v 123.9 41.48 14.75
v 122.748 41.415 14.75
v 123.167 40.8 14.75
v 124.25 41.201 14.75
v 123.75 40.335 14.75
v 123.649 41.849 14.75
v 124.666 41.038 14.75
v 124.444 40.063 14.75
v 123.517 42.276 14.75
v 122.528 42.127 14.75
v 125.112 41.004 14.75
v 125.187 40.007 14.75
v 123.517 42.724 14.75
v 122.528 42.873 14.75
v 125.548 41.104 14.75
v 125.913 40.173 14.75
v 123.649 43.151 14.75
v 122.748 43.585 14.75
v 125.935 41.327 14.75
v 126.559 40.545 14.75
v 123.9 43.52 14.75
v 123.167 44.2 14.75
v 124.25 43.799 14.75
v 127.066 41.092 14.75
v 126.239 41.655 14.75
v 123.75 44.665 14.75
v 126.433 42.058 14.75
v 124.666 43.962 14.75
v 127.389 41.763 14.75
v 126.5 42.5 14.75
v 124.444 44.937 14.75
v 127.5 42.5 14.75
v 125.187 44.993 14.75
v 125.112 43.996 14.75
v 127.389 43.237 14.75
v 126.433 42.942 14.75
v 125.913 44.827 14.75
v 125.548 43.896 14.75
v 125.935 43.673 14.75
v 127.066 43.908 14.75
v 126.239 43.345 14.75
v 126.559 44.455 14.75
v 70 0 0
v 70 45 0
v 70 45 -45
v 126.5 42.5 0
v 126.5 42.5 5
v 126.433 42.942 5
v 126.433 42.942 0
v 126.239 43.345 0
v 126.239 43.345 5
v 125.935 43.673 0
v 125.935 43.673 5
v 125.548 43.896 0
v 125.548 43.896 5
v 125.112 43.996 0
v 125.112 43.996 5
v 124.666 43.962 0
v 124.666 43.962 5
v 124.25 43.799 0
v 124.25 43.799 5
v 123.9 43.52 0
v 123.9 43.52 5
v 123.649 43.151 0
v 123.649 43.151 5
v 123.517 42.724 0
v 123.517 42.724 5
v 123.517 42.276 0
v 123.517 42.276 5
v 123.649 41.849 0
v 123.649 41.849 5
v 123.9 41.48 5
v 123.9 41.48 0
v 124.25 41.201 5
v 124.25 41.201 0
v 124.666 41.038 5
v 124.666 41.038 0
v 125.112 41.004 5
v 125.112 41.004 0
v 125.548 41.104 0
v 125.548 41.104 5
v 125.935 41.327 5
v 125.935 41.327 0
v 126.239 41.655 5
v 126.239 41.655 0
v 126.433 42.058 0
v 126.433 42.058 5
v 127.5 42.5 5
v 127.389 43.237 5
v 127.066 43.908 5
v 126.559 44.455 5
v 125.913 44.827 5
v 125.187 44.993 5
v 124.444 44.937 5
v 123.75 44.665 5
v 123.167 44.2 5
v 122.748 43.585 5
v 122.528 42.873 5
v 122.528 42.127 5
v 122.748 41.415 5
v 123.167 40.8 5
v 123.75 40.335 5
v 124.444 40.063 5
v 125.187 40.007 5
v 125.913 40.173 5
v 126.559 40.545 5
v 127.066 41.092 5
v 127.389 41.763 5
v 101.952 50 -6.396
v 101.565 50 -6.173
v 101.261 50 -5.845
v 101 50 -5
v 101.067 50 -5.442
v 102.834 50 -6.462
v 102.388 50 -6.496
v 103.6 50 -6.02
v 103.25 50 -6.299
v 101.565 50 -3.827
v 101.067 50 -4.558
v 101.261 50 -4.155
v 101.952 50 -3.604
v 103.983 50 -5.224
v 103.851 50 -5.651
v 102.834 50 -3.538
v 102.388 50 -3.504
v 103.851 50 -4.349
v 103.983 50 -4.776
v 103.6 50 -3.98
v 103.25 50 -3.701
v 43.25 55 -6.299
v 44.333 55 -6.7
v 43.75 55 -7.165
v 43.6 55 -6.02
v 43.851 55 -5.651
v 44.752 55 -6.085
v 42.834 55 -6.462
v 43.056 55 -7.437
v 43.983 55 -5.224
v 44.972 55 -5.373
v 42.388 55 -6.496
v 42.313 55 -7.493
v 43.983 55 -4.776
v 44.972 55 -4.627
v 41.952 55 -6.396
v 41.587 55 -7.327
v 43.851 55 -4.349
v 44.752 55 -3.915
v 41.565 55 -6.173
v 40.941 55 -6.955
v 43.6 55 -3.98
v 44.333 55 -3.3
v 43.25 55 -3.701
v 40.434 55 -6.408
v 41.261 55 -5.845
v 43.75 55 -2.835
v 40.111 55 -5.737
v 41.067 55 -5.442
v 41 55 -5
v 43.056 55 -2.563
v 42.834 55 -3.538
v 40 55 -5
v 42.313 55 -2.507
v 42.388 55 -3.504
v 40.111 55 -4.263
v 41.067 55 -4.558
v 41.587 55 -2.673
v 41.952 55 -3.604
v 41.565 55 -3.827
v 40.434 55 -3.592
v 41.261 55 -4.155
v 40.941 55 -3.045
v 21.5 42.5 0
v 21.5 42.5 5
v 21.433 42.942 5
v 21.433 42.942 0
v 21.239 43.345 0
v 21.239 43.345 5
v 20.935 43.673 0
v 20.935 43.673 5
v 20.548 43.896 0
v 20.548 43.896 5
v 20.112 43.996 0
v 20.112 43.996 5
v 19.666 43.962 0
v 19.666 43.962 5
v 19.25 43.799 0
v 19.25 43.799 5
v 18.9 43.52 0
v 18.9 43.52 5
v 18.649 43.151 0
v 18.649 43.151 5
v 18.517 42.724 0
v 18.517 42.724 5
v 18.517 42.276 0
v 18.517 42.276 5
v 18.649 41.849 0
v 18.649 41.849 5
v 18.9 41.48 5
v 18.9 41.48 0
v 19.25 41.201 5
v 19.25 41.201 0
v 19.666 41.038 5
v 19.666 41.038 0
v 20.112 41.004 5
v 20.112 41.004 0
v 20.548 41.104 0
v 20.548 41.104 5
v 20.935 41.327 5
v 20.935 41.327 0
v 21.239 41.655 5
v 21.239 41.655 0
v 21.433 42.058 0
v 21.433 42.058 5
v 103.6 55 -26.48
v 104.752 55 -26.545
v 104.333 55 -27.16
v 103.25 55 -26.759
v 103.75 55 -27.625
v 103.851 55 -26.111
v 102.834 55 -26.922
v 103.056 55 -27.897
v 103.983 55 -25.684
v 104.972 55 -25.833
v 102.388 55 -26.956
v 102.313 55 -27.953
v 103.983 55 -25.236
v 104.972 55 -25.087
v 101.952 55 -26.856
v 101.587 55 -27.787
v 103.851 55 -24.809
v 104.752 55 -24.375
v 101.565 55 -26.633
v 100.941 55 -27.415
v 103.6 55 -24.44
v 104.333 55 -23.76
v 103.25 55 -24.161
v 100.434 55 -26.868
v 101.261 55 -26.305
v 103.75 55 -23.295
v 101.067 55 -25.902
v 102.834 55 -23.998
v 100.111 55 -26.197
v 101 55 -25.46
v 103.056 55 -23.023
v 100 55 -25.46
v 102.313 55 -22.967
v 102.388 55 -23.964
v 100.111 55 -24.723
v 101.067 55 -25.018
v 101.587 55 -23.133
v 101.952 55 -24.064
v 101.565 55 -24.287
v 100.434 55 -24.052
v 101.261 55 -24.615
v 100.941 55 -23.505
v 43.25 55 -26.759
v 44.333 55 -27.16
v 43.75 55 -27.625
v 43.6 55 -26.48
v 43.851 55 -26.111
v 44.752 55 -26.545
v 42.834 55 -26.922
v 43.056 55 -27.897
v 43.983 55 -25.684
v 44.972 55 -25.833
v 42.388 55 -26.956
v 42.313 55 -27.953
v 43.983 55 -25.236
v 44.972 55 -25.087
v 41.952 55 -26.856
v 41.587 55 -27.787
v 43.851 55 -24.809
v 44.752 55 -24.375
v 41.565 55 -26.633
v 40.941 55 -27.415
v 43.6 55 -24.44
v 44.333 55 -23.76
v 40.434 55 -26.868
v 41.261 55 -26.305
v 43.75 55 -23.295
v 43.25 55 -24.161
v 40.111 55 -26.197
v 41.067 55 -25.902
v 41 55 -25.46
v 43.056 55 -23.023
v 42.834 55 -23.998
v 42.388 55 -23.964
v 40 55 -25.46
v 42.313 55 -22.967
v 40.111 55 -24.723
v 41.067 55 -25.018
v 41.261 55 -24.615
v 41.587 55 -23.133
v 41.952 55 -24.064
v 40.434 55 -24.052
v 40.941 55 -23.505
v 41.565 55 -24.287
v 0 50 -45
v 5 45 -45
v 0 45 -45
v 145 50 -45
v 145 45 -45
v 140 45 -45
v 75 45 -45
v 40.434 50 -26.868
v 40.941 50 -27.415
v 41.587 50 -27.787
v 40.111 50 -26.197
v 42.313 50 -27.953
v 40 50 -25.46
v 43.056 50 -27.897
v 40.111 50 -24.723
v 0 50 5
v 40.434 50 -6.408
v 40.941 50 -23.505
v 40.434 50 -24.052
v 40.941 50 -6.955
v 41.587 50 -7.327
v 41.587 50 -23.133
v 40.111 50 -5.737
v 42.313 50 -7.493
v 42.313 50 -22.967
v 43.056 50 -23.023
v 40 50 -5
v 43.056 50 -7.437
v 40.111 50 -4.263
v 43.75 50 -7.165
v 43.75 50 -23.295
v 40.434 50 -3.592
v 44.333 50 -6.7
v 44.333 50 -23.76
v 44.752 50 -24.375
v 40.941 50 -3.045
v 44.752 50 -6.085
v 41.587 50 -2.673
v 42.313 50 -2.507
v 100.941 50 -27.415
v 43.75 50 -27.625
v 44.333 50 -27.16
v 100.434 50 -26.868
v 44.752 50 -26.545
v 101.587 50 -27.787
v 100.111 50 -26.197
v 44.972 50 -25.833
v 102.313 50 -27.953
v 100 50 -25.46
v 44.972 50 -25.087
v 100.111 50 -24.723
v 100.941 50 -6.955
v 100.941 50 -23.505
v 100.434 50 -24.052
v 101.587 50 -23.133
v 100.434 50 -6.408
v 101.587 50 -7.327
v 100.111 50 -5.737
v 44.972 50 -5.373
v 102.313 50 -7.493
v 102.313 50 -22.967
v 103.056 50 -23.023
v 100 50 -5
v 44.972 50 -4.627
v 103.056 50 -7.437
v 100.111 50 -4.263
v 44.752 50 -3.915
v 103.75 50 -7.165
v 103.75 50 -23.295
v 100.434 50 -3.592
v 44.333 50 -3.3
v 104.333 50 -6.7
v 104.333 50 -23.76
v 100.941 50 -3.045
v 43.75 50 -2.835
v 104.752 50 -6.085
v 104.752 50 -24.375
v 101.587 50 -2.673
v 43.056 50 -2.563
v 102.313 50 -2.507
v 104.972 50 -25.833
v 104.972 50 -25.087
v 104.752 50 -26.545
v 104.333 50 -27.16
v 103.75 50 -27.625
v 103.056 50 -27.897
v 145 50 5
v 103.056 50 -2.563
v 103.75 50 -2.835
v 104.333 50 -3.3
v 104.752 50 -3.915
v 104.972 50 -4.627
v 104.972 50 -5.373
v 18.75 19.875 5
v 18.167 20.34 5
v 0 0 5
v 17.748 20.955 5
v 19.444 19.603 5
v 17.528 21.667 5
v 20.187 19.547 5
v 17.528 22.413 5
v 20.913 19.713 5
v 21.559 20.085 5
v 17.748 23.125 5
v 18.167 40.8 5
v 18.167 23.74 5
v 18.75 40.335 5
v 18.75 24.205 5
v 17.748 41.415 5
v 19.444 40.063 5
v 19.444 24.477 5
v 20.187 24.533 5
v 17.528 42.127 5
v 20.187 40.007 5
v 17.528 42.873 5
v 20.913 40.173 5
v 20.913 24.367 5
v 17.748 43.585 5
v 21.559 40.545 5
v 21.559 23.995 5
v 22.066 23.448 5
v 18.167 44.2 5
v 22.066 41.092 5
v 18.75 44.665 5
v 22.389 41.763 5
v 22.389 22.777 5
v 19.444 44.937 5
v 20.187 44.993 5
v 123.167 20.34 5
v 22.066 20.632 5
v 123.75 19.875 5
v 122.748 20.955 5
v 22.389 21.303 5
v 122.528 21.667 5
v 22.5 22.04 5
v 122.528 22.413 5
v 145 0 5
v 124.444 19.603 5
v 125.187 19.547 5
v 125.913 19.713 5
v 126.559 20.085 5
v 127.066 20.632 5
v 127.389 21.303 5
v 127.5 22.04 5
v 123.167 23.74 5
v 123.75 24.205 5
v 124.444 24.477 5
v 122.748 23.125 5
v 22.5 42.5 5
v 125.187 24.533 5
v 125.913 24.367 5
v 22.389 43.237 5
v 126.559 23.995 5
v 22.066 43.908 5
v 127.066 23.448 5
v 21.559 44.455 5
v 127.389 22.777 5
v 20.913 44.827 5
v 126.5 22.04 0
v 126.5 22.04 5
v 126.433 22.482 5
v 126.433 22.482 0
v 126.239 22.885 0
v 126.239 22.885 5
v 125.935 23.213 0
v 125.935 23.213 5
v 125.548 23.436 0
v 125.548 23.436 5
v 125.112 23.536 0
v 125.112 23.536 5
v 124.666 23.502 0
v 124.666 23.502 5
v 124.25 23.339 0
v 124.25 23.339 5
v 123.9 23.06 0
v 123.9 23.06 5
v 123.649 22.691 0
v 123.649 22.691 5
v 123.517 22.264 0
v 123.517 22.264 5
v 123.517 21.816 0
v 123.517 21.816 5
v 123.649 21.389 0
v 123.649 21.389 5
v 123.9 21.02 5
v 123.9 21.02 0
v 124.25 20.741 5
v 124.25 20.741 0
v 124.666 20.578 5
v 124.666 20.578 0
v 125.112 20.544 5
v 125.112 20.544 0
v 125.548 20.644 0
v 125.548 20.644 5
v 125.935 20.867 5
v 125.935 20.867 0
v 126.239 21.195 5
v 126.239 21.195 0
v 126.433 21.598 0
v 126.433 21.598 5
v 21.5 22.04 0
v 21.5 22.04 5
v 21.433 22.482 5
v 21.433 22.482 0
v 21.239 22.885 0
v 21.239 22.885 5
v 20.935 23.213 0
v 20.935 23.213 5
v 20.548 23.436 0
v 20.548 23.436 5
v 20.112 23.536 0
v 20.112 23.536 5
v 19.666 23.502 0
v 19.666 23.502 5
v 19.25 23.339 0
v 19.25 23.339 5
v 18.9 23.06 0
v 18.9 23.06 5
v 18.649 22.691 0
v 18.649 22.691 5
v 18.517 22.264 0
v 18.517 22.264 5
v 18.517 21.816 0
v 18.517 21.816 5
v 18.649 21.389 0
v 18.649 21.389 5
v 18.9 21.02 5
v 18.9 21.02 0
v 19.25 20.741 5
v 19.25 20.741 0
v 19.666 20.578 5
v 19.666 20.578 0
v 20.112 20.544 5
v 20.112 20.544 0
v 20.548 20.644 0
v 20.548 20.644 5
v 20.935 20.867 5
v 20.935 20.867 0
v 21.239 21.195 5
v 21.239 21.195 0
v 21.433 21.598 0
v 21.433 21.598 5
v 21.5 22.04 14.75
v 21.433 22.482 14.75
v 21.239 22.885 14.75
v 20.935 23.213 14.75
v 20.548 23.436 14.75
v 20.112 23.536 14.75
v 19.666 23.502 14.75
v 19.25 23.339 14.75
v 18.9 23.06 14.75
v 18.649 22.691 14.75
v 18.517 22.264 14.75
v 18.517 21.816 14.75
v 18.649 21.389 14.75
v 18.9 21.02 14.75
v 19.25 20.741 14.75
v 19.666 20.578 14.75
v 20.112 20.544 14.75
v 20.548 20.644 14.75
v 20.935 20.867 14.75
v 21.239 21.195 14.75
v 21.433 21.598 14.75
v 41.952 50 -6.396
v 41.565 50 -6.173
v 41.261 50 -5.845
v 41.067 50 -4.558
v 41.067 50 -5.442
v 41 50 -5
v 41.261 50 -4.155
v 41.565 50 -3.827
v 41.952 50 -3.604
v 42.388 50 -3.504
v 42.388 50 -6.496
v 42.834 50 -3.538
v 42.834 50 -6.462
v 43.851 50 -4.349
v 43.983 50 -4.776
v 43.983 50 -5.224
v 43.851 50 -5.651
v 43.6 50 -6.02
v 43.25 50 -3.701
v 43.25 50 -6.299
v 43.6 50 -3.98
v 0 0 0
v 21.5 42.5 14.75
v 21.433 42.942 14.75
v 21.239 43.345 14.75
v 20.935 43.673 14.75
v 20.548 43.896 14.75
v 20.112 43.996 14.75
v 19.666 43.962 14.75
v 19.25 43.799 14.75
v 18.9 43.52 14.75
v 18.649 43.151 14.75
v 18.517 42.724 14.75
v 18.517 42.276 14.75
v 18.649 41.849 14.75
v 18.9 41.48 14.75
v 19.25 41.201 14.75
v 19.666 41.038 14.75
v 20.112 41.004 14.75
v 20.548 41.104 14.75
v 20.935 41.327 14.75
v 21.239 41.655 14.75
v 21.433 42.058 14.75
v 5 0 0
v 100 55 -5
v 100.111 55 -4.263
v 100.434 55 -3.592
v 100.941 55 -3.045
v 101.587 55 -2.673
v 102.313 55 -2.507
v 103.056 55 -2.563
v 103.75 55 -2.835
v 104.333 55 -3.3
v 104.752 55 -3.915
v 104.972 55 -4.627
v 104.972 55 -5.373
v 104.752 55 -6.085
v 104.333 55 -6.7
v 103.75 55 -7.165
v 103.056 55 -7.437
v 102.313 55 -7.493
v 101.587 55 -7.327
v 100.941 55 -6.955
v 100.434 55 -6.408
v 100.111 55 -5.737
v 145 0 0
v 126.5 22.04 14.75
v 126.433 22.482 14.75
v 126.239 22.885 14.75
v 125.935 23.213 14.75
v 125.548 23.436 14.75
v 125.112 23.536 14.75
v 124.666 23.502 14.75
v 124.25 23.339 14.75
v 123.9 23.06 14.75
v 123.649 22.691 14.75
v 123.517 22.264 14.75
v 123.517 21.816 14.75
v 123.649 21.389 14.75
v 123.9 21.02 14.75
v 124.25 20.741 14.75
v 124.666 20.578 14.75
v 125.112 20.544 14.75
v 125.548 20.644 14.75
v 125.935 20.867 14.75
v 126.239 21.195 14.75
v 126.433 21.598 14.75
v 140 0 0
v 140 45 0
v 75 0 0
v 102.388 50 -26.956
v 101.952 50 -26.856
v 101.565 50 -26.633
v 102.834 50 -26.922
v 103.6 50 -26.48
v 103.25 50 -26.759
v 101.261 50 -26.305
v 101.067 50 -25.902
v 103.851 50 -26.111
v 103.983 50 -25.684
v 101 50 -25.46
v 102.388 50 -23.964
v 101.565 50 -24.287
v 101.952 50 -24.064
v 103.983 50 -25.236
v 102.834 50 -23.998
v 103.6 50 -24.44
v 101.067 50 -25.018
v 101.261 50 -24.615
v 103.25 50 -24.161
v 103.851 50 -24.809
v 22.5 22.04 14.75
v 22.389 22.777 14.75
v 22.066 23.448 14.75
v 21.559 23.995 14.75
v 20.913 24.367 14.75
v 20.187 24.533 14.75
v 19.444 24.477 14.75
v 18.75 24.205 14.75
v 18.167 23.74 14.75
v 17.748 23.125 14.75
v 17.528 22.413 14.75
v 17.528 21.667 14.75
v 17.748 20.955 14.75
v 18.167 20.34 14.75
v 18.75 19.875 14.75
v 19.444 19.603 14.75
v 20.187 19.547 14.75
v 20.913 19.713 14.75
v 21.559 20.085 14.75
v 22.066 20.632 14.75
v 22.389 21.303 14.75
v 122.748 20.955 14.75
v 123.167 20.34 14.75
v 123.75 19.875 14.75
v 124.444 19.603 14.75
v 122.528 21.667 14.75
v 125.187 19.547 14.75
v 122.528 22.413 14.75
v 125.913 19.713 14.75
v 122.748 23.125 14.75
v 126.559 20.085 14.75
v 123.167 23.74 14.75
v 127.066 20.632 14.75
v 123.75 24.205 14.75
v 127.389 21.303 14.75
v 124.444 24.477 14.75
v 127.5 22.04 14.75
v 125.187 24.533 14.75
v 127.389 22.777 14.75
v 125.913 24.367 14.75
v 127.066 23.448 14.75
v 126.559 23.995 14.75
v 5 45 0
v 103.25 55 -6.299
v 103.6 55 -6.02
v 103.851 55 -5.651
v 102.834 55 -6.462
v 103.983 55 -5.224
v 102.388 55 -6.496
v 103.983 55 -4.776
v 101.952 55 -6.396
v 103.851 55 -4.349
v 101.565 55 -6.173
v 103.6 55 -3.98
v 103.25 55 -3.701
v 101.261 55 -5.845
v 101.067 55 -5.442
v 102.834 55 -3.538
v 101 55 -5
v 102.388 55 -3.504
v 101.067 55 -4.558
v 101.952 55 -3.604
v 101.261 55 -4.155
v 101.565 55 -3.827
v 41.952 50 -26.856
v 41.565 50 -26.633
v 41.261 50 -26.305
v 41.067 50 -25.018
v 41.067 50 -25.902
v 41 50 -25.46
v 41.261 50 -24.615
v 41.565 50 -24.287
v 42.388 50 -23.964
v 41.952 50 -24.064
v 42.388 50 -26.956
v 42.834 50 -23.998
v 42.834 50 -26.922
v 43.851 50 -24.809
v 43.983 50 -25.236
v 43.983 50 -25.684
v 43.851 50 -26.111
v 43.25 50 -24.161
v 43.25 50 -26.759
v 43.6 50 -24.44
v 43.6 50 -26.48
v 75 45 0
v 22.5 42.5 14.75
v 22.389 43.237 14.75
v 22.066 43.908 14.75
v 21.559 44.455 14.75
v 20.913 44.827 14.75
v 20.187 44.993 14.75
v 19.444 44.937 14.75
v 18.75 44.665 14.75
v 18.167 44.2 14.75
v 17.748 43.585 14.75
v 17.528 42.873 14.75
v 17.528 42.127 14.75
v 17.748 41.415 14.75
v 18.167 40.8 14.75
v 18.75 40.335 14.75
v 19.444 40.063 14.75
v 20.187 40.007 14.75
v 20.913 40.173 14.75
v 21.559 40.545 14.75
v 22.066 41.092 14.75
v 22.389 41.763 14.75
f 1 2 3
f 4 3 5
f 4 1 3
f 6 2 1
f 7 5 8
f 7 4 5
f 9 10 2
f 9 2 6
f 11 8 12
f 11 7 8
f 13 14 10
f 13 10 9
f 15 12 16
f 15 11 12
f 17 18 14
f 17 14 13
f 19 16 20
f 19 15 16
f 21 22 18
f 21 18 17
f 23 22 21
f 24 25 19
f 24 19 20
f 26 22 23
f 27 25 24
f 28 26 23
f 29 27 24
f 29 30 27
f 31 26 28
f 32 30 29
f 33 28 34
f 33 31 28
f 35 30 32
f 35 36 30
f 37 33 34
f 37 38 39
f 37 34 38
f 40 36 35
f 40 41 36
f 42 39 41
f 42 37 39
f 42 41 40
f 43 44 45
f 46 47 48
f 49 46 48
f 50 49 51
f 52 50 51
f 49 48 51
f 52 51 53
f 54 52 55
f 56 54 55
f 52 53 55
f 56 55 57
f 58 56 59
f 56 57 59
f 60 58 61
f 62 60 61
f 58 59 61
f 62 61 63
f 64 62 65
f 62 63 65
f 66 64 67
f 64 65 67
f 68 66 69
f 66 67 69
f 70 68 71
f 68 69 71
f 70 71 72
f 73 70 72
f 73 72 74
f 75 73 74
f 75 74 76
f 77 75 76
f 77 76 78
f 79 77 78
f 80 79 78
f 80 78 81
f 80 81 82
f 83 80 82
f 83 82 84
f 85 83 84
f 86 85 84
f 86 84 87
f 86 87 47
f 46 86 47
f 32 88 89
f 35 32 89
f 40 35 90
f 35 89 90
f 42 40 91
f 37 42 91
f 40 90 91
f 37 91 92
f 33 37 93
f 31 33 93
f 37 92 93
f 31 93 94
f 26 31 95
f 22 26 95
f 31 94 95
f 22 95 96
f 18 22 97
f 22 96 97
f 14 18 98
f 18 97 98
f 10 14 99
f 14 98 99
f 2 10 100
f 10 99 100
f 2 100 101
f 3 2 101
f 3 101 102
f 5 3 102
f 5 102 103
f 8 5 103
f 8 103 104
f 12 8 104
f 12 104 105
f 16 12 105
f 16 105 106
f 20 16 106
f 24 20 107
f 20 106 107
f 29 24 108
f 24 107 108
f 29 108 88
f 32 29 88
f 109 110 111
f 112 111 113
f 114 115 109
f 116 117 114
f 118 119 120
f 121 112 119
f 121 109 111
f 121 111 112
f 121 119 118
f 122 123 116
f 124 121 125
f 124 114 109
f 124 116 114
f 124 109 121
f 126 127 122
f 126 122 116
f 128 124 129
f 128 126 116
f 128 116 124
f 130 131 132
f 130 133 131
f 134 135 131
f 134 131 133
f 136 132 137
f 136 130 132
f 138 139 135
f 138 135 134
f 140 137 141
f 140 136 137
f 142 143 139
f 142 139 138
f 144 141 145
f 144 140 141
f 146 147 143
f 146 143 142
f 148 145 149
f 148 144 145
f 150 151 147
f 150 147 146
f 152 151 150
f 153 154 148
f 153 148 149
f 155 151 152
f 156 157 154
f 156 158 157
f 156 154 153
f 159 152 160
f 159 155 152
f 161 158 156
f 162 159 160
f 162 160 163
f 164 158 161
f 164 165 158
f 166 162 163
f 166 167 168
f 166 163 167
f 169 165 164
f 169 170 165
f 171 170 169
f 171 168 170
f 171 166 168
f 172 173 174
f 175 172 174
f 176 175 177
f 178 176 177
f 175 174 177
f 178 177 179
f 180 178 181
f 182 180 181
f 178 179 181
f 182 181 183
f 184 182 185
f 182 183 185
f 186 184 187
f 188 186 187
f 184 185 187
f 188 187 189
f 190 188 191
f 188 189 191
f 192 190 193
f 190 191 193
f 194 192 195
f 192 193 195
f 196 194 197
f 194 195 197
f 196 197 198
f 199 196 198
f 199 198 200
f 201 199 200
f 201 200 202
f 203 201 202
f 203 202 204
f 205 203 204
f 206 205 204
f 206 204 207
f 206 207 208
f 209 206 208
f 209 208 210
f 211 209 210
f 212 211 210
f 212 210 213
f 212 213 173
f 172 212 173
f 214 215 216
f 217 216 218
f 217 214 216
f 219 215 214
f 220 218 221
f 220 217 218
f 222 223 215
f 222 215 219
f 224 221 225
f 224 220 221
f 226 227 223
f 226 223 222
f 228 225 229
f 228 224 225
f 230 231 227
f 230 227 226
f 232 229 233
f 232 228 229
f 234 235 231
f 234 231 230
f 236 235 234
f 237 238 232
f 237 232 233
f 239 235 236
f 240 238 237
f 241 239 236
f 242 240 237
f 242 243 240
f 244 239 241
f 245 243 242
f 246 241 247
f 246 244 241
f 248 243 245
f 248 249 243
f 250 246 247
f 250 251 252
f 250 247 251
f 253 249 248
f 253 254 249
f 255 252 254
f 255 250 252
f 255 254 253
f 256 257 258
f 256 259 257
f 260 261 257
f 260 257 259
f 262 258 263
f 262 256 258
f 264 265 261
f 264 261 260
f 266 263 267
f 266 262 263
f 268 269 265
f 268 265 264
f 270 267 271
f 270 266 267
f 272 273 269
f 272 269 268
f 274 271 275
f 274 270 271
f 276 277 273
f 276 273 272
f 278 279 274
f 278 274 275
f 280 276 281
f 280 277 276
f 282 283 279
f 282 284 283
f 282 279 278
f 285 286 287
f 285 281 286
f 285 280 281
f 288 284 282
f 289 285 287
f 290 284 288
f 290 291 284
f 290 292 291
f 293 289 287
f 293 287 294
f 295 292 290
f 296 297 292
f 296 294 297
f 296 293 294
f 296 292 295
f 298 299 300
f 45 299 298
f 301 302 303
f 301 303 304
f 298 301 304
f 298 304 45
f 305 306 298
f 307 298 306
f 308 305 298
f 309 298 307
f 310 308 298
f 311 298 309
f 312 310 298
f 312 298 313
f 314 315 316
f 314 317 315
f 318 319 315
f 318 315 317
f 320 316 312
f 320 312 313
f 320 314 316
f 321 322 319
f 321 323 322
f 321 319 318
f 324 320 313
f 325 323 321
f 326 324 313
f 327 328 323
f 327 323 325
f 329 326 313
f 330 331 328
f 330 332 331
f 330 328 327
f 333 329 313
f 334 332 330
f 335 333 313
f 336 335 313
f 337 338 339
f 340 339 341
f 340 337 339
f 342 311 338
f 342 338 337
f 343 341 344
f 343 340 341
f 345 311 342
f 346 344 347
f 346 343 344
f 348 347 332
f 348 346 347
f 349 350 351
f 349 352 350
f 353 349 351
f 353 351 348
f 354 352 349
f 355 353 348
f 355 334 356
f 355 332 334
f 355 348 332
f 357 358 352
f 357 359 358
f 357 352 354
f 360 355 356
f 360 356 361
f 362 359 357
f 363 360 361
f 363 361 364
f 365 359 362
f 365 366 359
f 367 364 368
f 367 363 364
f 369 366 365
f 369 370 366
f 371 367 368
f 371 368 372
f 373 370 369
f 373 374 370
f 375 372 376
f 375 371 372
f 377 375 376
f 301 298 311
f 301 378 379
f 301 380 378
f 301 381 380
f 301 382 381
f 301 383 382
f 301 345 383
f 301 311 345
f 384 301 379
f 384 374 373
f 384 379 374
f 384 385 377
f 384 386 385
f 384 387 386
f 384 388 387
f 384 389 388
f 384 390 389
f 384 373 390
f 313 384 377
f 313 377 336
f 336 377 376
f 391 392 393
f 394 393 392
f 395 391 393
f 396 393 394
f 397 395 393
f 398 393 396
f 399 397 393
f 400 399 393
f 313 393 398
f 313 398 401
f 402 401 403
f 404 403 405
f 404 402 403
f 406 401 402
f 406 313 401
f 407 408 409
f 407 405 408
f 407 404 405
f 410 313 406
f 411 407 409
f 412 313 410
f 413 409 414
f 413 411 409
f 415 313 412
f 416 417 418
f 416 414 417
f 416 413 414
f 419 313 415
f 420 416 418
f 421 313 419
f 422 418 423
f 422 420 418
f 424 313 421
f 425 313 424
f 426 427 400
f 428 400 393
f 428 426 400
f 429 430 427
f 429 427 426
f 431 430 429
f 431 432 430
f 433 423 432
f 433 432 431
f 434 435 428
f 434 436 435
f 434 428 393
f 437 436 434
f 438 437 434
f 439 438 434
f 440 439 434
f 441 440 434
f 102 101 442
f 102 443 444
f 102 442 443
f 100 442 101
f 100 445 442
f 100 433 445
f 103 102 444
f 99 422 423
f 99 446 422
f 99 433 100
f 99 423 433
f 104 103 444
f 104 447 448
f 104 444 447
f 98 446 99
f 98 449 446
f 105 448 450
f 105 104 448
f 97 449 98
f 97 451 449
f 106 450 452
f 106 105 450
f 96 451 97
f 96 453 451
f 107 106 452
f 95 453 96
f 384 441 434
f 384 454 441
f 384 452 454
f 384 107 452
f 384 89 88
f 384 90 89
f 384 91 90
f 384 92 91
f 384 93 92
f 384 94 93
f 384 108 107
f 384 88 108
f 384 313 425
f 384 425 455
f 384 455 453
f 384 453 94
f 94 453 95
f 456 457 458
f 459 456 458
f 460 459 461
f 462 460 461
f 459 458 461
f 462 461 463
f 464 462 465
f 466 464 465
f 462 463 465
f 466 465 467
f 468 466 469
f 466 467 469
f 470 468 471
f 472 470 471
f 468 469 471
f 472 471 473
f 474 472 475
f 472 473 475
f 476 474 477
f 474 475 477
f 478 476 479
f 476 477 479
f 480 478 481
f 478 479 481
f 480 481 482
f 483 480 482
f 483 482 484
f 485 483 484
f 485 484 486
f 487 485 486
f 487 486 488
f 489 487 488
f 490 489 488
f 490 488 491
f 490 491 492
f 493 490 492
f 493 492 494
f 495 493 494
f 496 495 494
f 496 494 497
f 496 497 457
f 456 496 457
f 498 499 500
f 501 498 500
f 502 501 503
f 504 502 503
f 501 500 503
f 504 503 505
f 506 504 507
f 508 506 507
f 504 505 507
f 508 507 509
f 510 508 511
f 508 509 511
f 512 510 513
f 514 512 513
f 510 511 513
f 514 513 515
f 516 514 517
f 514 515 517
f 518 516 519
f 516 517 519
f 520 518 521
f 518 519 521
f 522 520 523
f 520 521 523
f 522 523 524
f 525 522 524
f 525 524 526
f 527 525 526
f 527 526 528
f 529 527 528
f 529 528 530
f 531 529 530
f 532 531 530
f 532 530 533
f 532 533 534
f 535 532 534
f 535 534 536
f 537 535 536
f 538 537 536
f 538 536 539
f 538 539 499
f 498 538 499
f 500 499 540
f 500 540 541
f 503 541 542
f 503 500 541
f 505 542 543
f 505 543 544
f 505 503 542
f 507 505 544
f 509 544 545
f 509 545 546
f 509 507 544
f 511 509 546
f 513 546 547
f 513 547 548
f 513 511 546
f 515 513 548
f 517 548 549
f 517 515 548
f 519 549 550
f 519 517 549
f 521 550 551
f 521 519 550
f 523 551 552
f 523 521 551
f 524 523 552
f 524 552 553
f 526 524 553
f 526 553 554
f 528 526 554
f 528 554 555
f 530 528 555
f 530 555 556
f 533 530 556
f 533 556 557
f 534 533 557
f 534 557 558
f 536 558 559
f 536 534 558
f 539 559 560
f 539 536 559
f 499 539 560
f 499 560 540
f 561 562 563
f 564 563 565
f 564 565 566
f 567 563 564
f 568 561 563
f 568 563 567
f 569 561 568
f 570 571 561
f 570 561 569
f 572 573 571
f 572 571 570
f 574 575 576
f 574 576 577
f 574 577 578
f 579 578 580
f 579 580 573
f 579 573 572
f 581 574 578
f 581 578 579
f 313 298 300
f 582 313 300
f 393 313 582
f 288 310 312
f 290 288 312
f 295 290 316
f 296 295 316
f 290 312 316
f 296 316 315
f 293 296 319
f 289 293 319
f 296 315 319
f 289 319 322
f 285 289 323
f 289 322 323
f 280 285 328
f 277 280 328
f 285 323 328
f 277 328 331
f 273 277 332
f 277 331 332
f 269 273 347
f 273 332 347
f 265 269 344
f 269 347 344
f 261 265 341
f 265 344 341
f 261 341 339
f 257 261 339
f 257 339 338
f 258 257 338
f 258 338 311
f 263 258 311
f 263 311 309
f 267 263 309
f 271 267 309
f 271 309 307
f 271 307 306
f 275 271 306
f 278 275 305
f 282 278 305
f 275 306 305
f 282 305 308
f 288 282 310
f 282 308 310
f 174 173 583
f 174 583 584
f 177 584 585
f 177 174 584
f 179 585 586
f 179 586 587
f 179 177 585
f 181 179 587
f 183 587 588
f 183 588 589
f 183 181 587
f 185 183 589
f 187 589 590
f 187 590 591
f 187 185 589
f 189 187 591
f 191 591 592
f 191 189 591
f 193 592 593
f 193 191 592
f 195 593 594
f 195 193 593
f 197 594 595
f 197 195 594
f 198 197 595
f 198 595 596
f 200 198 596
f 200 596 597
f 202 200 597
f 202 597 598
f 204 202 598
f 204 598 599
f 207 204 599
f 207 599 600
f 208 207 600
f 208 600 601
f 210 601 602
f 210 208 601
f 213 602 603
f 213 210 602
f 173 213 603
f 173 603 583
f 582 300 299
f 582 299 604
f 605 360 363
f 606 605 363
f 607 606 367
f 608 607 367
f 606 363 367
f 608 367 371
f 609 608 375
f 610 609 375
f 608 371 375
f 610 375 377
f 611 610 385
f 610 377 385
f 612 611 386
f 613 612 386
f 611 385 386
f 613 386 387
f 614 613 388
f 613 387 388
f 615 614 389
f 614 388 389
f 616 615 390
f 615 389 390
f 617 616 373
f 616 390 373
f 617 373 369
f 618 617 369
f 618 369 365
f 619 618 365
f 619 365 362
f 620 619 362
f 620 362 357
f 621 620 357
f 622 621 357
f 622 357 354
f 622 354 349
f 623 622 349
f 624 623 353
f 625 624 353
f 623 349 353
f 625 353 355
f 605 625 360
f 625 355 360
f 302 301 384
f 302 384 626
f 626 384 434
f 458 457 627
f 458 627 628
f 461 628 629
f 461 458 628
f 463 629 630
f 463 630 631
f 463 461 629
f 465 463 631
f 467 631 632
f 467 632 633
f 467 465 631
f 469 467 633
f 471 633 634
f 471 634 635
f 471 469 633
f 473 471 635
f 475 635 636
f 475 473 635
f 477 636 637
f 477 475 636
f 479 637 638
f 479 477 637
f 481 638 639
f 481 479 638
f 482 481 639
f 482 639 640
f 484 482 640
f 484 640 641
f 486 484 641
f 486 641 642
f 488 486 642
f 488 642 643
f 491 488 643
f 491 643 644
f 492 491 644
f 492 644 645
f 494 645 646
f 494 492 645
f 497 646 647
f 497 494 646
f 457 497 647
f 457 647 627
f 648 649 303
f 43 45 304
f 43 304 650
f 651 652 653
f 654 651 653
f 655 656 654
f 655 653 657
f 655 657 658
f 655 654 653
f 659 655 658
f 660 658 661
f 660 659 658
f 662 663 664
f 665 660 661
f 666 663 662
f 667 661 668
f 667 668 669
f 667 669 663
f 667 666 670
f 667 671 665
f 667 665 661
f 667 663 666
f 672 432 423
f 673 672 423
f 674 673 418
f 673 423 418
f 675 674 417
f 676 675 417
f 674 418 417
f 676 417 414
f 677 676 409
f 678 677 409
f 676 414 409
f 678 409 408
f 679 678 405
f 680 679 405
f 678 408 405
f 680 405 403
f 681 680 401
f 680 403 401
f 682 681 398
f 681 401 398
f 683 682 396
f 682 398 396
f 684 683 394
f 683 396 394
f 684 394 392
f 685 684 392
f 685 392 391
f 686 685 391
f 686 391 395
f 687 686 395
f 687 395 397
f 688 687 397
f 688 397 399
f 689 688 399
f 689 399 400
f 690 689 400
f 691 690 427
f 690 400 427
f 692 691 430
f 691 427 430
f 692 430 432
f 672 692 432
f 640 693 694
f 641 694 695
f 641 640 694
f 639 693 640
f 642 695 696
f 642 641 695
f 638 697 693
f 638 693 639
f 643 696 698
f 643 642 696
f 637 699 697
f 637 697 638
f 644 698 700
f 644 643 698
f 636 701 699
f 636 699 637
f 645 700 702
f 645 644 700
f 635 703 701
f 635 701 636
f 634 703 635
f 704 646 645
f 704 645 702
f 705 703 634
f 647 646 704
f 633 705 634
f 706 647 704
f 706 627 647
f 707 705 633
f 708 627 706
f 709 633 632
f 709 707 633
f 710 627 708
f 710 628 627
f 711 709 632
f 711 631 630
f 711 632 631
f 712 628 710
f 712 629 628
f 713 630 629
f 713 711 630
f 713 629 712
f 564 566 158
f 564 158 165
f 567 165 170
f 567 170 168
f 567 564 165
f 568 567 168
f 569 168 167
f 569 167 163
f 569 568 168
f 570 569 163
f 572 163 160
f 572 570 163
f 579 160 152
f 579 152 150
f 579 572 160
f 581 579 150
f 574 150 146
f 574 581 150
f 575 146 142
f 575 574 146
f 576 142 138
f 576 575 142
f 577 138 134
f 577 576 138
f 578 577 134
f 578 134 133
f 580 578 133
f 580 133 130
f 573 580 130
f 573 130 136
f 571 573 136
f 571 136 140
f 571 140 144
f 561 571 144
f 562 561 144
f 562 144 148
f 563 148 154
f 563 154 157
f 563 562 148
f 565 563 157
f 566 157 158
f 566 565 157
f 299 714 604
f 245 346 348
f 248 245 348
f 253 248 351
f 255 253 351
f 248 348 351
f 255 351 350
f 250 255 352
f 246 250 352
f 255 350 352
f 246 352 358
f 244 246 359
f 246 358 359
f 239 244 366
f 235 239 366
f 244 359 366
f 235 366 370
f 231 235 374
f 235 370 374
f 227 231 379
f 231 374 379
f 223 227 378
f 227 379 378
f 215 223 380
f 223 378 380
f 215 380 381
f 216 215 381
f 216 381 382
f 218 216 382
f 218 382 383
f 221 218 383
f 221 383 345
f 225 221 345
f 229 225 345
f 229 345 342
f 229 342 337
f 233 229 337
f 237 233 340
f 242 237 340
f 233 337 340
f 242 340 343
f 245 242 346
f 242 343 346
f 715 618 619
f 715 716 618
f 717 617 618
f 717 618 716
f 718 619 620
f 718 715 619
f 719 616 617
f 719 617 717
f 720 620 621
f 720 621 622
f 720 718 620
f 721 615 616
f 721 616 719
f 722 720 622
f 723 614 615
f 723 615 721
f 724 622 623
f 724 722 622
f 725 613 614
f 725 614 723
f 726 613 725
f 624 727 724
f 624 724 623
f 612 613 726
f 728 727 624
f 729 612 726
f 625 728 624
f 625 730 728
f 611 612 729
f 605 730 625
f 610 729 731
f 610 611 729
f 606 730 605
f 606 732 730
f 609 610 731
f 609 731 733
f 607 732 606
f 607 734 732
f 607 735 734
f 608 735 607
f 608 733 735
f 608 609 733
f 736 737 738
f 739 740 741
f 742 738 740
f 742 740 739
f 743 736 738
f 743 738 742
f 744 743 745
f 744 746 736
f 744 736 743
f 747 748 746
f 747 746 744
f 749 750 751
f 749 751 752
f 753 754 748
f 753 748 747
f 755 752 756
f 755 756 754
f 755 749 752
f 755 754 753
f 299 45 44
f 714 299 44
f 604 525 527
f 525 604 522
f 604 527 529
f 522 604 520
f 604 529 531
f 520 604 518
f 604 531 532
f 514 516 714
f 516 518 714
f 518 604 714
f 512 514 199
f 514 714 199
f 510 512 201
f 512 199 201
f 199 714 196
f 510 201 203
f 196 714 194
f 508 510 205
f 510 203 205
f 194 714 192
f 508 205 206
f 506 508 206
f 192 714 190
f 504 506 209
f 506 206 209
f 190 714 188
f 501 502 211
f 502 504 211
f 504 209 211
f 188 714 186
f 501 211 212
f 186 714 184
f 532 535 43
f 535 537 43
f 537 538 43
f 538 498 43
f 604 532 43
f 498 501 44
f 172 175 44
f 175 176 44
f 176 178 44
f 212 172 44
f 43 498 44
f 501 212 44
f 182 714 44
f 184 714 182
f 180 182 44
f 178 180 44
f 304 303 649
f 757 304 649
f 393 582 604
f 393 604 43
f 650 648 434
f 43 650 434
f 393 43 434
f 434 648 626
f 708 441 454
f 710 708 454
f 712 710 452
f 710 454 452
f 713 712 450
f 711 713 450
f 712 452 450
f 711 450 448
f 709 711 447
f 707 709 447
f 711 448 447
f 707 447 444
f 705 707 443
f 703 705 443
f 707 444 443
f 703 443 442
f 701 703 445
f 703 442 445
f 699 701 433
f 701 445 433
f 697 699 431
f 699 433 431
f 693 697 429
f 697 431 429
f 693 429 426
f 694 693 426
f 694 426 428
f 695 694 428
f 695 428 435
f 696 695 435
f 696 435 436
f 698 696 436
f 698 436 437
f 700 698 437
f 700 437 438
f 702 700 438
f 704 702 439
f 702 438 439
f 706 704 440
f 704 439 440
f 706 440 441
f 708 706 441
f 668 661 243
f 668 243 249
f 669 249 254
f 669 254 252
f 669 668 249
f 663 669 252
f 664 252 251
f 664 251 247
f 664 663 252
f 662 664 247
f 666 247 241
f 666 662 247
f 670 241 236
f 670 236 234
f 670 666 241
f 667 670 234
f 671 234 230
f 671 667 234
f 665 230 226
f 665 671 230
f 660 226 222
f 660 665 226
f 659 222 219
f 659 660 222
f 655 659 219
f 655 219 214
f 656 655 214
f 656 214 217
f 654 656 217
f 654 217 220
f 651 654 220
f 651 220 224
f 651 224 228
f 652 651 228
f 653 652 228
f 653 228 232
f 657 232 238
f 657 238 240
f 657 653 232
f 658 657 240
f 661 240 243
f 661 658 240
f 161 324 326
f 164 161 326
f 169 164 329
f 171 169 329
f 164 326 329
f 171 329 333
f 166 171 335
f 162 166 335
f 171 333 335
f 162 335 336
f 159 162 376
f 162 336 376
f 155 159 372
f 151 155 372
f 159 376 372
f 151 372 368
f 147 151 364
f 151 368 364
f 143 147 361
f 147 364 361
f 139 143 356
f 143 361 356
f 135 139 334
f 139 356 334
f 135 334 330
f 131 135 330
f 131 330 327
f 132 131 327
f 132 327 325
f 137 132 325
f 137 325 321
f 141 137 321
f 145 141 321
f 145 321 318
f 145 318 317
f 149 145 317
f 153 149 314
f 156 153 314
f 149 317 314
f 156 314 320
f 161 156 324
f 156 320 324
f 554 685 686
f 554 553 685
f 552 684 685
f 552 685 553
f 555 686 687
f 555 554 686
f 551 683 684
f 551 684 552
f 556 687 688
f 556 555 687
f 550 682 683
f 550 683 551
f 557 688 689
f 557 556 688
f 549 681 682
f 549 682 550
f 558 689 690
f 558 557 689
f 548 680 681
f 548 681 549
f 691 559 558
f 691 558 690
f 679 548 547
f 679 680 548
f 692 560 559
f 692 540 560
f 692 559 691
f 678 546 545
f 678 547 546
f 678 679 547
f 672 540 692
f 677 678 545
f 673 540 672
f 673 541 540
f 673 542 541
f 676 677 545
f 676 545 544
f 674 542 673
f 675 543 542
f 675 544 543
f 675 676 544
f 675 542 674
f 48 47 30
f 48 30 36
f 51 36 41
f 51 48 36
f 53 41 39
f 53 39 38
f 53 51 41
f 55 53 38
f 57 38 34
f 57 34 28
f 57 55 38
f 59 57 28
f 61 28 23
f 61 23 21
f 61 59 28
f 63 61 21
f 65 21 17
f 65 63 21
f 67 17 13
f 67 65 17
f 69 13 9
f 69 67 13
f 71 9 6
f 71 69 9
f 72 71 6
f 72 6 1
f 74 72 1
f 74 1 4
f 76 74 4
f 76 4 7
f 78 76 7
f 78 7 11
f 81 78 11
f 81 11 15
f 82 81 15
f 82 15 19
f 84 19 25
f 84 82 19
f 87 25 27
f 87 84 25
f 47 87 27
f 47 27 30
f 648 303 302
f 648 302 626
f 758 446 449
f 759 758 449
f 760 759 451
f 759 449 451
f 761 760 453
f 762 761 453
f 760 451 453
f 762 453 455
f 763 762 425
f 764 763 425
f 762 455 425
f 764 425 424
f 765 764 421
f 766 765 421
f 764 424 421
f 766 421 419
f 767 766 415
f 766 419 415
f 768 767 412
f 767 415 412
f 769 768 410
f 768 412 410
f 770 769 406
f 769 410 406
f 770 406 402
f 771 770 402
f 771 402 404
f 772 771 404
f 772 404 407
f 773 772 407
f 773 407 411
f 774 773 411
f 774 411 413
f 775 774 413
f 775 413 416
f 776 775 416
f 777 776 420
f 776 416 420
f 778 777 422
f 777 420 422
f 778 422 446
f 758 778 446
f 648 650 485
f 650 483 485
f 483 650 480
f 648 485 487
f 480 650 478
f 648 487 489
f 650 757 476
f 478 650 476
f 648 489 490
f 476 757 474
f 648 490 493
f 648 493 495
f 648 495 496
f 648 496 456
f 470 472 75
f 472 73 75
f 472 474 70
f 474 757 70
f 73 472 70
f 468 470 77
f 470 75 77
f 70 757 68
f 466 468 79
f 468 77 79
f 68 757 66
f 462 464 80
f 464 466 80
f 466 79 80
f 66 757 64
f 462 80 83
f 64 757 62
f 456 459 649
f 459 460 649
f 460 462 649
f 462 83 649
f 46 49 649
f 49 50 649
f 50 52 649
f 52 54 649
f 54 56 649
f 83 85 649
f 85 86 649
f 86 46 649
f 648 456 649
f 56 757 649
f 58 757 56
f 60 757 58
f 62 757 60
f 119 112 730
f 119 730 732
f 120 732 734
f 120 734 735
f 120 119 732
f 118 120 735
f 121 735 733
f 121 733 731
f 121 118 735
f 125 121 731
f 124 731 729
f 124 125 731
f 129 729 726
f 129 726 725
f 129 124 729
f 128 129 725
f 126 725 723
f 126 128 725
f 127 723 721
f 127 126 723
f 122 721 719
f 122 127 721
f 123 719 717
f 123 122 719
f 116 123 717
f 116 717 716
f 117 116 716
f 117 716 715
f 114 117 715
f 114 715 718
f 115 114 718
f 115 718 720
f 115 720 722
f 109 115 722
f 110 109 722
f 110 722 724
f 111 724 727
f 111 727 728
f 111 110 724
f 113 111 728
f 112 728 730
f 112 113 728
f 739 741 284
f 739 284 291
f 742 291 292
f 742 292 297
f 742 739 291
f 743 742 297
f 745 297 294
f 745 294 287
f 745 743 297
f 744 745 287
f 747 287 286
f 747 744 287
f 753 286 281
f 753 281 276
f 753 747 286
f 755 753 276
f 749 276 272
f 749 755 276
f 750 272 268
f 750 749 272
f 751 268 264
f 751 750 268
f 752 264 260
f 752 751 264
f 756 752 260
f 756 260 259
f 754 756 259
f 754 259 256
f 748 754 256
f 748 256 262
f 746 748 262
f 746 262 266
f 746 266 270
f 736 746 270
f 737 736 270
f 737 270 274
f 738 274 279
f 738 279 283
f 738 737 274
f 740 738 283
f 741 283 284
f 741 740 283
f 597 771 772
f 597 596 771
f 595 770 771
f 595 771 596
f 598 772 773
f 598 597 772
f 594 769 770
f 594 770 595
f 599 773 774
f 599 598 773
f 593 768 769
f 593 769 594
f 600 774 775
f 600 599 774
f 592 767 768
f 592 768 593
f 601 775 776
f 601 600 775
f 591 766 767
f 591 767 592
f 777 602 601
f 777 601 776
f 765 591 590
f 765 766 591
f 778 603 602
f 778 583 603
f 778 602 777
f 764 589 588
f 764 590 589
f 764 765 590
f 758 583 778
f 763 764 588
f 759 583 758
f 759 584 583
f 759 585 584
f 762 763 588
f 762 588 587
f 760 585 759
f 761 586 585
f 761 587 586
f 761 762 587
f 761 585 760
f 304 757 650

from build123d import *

# Parameters (mm, degrees)
F0_W      = 145
F0_H      = 50
F1_DEPTH  = 5
F2_R      = 2.5
F2_R_2    = 1.5
F3_DEPTH  = 9.75
F4_R      = 1.5
F5_DEPTH  = 25
F6_W      = 5
F6_H      = 45
F7_DEPTH  = 145
F9_DEPTH  = 5
F10_START = -70
F10_DEPTH = 5
F11_START = -140
F11_DEPTH = 5
F12_R     = 2.5
F12_R_2   = 1.5
F13_DEPTH = 5


with BuildPart() as f1:
    # F0 (on Top) → F1 (new body)
    with BuildSketch(Plane.XY):
        with Locations((72.5, 25)):
            Rectangle(F0_W, F0_H)
    extrude(amount=F1_DEPTH)

    # F2 (on face) → F3 (join)
    with BuildSketch(Plane.XY.offset(5)):
        with Locations((20, 42.5)):
            Circle(F2_R)
        with Locations((20, 42.5)):
            Circle(F2_R_2, mode=Mode.SUBTRACT)
        with Locations((20, 22.04)):
            Circle(F2_R)
        with Locations((20, 22.04)):
            Circle(F2_R_2, mode=Mode.SUBTRACT)
        with Locations((125, 42.5)):
            Circle(F2_R)
        with Locations((125, 42.5)):
            Circle(F2_R_2, mode=Mode.SUBTRACT)
        with Locations((125, 22.04)):
            Circle(F2_R)
        with Locations((125, 22.04)):
            Circle(F2_R_2, mode=Mode.SUBTRACT)
    extrude(amount=F3_DEPTH)

    # F4 (on face) → F5 (cut)
    with BuildSketch(Plane.XY.offset(5)):
        with Locations((20, 42.5)):
            Circle(F4_R)
        with Locations((20, 22.04)):
            Circle(F4_R)
        with Locations((125, 42.5)):
            Circle(F4_R)
        with Locations((125, 22.04)):
            Circle(F4_R)
    extrude(amount=-F5_DEPTH, mode=Mode.SUBTRACT)

    # F6 (on face) → F7 (join, through all)
    with BuildSketch(Plane.YZ.offset(145)):
        with Locations((47.5, -22.5)):
            Rectangle(F6_W, F6_H)
    extrude(amount=-F7_DEPTH)

    # F8 (on face) → F9 (join)
    with BuildSketch(Plane(origin=(0, 0, 0), x_dir=(0, -1, 0), z_dir=(-1, 0, 0))):
        Polygon((-45, 0), (-45, -45), (0, 0), align=None)
    extrude(amount=-F9_DEPTH)

    # F8 (on face) → F10 (join)
    with BuildSketch(Plane(origin=(0, 0, 0), x_dir=(0, -1, 0), z_dir=(-1, 0, 0)).offset(F10_START)):
        Polygon((-45, 0), (-45, -45), (0, 0), align=None)
    extrude(amount=-F10_DEPTH)

    # F8 (on face) → F11 (join)
    with BuildSketch(Plane(origin=(0, 0, 0), x_dir=(0, -1, 0), z_dir=(-1, 0, 0)).offset(F11_START)):
        Polygon((-45, 0), (-45, -45), (0, 0), align=None)
    extrude(amount=-F11_DEPTH)

    # F12 (on face) → F13 (join)
    with BuildSketch(Plane(origin=(0, 50, 0), x_dir=(-1, 0, 0), z_dir=(0, 1, 0))):
        with Locations((-102.5, -5)):
            Circle(F12_R)
        with Locations((-102.5, -5)):
            Circle(F12_R_2, mode=Mode.SUBTRACT)
        with Locations((-102.5, -25.46)):
            Circle(F12_R)
        with Locations((-102.5, -25.46)):
            Circle(F12_R_2, mode=Mode.SUBTRACT)
        with Locations((-42.5, -5)):
            Circle(F12_R)
        with Locations((-42.5, -5)):
            Circle(F12_R_2, mode=Mode.SUBTRACT)
        with Locations((-42.5, -25.46)):
            Circle(F12_R)
        with Locations((-42.5, -25.46)):
            Circle(F12_R_2, mode=Mode.SUBTRACT)
    extrude(amount=F13_DEPTH)


solid = f1.part
